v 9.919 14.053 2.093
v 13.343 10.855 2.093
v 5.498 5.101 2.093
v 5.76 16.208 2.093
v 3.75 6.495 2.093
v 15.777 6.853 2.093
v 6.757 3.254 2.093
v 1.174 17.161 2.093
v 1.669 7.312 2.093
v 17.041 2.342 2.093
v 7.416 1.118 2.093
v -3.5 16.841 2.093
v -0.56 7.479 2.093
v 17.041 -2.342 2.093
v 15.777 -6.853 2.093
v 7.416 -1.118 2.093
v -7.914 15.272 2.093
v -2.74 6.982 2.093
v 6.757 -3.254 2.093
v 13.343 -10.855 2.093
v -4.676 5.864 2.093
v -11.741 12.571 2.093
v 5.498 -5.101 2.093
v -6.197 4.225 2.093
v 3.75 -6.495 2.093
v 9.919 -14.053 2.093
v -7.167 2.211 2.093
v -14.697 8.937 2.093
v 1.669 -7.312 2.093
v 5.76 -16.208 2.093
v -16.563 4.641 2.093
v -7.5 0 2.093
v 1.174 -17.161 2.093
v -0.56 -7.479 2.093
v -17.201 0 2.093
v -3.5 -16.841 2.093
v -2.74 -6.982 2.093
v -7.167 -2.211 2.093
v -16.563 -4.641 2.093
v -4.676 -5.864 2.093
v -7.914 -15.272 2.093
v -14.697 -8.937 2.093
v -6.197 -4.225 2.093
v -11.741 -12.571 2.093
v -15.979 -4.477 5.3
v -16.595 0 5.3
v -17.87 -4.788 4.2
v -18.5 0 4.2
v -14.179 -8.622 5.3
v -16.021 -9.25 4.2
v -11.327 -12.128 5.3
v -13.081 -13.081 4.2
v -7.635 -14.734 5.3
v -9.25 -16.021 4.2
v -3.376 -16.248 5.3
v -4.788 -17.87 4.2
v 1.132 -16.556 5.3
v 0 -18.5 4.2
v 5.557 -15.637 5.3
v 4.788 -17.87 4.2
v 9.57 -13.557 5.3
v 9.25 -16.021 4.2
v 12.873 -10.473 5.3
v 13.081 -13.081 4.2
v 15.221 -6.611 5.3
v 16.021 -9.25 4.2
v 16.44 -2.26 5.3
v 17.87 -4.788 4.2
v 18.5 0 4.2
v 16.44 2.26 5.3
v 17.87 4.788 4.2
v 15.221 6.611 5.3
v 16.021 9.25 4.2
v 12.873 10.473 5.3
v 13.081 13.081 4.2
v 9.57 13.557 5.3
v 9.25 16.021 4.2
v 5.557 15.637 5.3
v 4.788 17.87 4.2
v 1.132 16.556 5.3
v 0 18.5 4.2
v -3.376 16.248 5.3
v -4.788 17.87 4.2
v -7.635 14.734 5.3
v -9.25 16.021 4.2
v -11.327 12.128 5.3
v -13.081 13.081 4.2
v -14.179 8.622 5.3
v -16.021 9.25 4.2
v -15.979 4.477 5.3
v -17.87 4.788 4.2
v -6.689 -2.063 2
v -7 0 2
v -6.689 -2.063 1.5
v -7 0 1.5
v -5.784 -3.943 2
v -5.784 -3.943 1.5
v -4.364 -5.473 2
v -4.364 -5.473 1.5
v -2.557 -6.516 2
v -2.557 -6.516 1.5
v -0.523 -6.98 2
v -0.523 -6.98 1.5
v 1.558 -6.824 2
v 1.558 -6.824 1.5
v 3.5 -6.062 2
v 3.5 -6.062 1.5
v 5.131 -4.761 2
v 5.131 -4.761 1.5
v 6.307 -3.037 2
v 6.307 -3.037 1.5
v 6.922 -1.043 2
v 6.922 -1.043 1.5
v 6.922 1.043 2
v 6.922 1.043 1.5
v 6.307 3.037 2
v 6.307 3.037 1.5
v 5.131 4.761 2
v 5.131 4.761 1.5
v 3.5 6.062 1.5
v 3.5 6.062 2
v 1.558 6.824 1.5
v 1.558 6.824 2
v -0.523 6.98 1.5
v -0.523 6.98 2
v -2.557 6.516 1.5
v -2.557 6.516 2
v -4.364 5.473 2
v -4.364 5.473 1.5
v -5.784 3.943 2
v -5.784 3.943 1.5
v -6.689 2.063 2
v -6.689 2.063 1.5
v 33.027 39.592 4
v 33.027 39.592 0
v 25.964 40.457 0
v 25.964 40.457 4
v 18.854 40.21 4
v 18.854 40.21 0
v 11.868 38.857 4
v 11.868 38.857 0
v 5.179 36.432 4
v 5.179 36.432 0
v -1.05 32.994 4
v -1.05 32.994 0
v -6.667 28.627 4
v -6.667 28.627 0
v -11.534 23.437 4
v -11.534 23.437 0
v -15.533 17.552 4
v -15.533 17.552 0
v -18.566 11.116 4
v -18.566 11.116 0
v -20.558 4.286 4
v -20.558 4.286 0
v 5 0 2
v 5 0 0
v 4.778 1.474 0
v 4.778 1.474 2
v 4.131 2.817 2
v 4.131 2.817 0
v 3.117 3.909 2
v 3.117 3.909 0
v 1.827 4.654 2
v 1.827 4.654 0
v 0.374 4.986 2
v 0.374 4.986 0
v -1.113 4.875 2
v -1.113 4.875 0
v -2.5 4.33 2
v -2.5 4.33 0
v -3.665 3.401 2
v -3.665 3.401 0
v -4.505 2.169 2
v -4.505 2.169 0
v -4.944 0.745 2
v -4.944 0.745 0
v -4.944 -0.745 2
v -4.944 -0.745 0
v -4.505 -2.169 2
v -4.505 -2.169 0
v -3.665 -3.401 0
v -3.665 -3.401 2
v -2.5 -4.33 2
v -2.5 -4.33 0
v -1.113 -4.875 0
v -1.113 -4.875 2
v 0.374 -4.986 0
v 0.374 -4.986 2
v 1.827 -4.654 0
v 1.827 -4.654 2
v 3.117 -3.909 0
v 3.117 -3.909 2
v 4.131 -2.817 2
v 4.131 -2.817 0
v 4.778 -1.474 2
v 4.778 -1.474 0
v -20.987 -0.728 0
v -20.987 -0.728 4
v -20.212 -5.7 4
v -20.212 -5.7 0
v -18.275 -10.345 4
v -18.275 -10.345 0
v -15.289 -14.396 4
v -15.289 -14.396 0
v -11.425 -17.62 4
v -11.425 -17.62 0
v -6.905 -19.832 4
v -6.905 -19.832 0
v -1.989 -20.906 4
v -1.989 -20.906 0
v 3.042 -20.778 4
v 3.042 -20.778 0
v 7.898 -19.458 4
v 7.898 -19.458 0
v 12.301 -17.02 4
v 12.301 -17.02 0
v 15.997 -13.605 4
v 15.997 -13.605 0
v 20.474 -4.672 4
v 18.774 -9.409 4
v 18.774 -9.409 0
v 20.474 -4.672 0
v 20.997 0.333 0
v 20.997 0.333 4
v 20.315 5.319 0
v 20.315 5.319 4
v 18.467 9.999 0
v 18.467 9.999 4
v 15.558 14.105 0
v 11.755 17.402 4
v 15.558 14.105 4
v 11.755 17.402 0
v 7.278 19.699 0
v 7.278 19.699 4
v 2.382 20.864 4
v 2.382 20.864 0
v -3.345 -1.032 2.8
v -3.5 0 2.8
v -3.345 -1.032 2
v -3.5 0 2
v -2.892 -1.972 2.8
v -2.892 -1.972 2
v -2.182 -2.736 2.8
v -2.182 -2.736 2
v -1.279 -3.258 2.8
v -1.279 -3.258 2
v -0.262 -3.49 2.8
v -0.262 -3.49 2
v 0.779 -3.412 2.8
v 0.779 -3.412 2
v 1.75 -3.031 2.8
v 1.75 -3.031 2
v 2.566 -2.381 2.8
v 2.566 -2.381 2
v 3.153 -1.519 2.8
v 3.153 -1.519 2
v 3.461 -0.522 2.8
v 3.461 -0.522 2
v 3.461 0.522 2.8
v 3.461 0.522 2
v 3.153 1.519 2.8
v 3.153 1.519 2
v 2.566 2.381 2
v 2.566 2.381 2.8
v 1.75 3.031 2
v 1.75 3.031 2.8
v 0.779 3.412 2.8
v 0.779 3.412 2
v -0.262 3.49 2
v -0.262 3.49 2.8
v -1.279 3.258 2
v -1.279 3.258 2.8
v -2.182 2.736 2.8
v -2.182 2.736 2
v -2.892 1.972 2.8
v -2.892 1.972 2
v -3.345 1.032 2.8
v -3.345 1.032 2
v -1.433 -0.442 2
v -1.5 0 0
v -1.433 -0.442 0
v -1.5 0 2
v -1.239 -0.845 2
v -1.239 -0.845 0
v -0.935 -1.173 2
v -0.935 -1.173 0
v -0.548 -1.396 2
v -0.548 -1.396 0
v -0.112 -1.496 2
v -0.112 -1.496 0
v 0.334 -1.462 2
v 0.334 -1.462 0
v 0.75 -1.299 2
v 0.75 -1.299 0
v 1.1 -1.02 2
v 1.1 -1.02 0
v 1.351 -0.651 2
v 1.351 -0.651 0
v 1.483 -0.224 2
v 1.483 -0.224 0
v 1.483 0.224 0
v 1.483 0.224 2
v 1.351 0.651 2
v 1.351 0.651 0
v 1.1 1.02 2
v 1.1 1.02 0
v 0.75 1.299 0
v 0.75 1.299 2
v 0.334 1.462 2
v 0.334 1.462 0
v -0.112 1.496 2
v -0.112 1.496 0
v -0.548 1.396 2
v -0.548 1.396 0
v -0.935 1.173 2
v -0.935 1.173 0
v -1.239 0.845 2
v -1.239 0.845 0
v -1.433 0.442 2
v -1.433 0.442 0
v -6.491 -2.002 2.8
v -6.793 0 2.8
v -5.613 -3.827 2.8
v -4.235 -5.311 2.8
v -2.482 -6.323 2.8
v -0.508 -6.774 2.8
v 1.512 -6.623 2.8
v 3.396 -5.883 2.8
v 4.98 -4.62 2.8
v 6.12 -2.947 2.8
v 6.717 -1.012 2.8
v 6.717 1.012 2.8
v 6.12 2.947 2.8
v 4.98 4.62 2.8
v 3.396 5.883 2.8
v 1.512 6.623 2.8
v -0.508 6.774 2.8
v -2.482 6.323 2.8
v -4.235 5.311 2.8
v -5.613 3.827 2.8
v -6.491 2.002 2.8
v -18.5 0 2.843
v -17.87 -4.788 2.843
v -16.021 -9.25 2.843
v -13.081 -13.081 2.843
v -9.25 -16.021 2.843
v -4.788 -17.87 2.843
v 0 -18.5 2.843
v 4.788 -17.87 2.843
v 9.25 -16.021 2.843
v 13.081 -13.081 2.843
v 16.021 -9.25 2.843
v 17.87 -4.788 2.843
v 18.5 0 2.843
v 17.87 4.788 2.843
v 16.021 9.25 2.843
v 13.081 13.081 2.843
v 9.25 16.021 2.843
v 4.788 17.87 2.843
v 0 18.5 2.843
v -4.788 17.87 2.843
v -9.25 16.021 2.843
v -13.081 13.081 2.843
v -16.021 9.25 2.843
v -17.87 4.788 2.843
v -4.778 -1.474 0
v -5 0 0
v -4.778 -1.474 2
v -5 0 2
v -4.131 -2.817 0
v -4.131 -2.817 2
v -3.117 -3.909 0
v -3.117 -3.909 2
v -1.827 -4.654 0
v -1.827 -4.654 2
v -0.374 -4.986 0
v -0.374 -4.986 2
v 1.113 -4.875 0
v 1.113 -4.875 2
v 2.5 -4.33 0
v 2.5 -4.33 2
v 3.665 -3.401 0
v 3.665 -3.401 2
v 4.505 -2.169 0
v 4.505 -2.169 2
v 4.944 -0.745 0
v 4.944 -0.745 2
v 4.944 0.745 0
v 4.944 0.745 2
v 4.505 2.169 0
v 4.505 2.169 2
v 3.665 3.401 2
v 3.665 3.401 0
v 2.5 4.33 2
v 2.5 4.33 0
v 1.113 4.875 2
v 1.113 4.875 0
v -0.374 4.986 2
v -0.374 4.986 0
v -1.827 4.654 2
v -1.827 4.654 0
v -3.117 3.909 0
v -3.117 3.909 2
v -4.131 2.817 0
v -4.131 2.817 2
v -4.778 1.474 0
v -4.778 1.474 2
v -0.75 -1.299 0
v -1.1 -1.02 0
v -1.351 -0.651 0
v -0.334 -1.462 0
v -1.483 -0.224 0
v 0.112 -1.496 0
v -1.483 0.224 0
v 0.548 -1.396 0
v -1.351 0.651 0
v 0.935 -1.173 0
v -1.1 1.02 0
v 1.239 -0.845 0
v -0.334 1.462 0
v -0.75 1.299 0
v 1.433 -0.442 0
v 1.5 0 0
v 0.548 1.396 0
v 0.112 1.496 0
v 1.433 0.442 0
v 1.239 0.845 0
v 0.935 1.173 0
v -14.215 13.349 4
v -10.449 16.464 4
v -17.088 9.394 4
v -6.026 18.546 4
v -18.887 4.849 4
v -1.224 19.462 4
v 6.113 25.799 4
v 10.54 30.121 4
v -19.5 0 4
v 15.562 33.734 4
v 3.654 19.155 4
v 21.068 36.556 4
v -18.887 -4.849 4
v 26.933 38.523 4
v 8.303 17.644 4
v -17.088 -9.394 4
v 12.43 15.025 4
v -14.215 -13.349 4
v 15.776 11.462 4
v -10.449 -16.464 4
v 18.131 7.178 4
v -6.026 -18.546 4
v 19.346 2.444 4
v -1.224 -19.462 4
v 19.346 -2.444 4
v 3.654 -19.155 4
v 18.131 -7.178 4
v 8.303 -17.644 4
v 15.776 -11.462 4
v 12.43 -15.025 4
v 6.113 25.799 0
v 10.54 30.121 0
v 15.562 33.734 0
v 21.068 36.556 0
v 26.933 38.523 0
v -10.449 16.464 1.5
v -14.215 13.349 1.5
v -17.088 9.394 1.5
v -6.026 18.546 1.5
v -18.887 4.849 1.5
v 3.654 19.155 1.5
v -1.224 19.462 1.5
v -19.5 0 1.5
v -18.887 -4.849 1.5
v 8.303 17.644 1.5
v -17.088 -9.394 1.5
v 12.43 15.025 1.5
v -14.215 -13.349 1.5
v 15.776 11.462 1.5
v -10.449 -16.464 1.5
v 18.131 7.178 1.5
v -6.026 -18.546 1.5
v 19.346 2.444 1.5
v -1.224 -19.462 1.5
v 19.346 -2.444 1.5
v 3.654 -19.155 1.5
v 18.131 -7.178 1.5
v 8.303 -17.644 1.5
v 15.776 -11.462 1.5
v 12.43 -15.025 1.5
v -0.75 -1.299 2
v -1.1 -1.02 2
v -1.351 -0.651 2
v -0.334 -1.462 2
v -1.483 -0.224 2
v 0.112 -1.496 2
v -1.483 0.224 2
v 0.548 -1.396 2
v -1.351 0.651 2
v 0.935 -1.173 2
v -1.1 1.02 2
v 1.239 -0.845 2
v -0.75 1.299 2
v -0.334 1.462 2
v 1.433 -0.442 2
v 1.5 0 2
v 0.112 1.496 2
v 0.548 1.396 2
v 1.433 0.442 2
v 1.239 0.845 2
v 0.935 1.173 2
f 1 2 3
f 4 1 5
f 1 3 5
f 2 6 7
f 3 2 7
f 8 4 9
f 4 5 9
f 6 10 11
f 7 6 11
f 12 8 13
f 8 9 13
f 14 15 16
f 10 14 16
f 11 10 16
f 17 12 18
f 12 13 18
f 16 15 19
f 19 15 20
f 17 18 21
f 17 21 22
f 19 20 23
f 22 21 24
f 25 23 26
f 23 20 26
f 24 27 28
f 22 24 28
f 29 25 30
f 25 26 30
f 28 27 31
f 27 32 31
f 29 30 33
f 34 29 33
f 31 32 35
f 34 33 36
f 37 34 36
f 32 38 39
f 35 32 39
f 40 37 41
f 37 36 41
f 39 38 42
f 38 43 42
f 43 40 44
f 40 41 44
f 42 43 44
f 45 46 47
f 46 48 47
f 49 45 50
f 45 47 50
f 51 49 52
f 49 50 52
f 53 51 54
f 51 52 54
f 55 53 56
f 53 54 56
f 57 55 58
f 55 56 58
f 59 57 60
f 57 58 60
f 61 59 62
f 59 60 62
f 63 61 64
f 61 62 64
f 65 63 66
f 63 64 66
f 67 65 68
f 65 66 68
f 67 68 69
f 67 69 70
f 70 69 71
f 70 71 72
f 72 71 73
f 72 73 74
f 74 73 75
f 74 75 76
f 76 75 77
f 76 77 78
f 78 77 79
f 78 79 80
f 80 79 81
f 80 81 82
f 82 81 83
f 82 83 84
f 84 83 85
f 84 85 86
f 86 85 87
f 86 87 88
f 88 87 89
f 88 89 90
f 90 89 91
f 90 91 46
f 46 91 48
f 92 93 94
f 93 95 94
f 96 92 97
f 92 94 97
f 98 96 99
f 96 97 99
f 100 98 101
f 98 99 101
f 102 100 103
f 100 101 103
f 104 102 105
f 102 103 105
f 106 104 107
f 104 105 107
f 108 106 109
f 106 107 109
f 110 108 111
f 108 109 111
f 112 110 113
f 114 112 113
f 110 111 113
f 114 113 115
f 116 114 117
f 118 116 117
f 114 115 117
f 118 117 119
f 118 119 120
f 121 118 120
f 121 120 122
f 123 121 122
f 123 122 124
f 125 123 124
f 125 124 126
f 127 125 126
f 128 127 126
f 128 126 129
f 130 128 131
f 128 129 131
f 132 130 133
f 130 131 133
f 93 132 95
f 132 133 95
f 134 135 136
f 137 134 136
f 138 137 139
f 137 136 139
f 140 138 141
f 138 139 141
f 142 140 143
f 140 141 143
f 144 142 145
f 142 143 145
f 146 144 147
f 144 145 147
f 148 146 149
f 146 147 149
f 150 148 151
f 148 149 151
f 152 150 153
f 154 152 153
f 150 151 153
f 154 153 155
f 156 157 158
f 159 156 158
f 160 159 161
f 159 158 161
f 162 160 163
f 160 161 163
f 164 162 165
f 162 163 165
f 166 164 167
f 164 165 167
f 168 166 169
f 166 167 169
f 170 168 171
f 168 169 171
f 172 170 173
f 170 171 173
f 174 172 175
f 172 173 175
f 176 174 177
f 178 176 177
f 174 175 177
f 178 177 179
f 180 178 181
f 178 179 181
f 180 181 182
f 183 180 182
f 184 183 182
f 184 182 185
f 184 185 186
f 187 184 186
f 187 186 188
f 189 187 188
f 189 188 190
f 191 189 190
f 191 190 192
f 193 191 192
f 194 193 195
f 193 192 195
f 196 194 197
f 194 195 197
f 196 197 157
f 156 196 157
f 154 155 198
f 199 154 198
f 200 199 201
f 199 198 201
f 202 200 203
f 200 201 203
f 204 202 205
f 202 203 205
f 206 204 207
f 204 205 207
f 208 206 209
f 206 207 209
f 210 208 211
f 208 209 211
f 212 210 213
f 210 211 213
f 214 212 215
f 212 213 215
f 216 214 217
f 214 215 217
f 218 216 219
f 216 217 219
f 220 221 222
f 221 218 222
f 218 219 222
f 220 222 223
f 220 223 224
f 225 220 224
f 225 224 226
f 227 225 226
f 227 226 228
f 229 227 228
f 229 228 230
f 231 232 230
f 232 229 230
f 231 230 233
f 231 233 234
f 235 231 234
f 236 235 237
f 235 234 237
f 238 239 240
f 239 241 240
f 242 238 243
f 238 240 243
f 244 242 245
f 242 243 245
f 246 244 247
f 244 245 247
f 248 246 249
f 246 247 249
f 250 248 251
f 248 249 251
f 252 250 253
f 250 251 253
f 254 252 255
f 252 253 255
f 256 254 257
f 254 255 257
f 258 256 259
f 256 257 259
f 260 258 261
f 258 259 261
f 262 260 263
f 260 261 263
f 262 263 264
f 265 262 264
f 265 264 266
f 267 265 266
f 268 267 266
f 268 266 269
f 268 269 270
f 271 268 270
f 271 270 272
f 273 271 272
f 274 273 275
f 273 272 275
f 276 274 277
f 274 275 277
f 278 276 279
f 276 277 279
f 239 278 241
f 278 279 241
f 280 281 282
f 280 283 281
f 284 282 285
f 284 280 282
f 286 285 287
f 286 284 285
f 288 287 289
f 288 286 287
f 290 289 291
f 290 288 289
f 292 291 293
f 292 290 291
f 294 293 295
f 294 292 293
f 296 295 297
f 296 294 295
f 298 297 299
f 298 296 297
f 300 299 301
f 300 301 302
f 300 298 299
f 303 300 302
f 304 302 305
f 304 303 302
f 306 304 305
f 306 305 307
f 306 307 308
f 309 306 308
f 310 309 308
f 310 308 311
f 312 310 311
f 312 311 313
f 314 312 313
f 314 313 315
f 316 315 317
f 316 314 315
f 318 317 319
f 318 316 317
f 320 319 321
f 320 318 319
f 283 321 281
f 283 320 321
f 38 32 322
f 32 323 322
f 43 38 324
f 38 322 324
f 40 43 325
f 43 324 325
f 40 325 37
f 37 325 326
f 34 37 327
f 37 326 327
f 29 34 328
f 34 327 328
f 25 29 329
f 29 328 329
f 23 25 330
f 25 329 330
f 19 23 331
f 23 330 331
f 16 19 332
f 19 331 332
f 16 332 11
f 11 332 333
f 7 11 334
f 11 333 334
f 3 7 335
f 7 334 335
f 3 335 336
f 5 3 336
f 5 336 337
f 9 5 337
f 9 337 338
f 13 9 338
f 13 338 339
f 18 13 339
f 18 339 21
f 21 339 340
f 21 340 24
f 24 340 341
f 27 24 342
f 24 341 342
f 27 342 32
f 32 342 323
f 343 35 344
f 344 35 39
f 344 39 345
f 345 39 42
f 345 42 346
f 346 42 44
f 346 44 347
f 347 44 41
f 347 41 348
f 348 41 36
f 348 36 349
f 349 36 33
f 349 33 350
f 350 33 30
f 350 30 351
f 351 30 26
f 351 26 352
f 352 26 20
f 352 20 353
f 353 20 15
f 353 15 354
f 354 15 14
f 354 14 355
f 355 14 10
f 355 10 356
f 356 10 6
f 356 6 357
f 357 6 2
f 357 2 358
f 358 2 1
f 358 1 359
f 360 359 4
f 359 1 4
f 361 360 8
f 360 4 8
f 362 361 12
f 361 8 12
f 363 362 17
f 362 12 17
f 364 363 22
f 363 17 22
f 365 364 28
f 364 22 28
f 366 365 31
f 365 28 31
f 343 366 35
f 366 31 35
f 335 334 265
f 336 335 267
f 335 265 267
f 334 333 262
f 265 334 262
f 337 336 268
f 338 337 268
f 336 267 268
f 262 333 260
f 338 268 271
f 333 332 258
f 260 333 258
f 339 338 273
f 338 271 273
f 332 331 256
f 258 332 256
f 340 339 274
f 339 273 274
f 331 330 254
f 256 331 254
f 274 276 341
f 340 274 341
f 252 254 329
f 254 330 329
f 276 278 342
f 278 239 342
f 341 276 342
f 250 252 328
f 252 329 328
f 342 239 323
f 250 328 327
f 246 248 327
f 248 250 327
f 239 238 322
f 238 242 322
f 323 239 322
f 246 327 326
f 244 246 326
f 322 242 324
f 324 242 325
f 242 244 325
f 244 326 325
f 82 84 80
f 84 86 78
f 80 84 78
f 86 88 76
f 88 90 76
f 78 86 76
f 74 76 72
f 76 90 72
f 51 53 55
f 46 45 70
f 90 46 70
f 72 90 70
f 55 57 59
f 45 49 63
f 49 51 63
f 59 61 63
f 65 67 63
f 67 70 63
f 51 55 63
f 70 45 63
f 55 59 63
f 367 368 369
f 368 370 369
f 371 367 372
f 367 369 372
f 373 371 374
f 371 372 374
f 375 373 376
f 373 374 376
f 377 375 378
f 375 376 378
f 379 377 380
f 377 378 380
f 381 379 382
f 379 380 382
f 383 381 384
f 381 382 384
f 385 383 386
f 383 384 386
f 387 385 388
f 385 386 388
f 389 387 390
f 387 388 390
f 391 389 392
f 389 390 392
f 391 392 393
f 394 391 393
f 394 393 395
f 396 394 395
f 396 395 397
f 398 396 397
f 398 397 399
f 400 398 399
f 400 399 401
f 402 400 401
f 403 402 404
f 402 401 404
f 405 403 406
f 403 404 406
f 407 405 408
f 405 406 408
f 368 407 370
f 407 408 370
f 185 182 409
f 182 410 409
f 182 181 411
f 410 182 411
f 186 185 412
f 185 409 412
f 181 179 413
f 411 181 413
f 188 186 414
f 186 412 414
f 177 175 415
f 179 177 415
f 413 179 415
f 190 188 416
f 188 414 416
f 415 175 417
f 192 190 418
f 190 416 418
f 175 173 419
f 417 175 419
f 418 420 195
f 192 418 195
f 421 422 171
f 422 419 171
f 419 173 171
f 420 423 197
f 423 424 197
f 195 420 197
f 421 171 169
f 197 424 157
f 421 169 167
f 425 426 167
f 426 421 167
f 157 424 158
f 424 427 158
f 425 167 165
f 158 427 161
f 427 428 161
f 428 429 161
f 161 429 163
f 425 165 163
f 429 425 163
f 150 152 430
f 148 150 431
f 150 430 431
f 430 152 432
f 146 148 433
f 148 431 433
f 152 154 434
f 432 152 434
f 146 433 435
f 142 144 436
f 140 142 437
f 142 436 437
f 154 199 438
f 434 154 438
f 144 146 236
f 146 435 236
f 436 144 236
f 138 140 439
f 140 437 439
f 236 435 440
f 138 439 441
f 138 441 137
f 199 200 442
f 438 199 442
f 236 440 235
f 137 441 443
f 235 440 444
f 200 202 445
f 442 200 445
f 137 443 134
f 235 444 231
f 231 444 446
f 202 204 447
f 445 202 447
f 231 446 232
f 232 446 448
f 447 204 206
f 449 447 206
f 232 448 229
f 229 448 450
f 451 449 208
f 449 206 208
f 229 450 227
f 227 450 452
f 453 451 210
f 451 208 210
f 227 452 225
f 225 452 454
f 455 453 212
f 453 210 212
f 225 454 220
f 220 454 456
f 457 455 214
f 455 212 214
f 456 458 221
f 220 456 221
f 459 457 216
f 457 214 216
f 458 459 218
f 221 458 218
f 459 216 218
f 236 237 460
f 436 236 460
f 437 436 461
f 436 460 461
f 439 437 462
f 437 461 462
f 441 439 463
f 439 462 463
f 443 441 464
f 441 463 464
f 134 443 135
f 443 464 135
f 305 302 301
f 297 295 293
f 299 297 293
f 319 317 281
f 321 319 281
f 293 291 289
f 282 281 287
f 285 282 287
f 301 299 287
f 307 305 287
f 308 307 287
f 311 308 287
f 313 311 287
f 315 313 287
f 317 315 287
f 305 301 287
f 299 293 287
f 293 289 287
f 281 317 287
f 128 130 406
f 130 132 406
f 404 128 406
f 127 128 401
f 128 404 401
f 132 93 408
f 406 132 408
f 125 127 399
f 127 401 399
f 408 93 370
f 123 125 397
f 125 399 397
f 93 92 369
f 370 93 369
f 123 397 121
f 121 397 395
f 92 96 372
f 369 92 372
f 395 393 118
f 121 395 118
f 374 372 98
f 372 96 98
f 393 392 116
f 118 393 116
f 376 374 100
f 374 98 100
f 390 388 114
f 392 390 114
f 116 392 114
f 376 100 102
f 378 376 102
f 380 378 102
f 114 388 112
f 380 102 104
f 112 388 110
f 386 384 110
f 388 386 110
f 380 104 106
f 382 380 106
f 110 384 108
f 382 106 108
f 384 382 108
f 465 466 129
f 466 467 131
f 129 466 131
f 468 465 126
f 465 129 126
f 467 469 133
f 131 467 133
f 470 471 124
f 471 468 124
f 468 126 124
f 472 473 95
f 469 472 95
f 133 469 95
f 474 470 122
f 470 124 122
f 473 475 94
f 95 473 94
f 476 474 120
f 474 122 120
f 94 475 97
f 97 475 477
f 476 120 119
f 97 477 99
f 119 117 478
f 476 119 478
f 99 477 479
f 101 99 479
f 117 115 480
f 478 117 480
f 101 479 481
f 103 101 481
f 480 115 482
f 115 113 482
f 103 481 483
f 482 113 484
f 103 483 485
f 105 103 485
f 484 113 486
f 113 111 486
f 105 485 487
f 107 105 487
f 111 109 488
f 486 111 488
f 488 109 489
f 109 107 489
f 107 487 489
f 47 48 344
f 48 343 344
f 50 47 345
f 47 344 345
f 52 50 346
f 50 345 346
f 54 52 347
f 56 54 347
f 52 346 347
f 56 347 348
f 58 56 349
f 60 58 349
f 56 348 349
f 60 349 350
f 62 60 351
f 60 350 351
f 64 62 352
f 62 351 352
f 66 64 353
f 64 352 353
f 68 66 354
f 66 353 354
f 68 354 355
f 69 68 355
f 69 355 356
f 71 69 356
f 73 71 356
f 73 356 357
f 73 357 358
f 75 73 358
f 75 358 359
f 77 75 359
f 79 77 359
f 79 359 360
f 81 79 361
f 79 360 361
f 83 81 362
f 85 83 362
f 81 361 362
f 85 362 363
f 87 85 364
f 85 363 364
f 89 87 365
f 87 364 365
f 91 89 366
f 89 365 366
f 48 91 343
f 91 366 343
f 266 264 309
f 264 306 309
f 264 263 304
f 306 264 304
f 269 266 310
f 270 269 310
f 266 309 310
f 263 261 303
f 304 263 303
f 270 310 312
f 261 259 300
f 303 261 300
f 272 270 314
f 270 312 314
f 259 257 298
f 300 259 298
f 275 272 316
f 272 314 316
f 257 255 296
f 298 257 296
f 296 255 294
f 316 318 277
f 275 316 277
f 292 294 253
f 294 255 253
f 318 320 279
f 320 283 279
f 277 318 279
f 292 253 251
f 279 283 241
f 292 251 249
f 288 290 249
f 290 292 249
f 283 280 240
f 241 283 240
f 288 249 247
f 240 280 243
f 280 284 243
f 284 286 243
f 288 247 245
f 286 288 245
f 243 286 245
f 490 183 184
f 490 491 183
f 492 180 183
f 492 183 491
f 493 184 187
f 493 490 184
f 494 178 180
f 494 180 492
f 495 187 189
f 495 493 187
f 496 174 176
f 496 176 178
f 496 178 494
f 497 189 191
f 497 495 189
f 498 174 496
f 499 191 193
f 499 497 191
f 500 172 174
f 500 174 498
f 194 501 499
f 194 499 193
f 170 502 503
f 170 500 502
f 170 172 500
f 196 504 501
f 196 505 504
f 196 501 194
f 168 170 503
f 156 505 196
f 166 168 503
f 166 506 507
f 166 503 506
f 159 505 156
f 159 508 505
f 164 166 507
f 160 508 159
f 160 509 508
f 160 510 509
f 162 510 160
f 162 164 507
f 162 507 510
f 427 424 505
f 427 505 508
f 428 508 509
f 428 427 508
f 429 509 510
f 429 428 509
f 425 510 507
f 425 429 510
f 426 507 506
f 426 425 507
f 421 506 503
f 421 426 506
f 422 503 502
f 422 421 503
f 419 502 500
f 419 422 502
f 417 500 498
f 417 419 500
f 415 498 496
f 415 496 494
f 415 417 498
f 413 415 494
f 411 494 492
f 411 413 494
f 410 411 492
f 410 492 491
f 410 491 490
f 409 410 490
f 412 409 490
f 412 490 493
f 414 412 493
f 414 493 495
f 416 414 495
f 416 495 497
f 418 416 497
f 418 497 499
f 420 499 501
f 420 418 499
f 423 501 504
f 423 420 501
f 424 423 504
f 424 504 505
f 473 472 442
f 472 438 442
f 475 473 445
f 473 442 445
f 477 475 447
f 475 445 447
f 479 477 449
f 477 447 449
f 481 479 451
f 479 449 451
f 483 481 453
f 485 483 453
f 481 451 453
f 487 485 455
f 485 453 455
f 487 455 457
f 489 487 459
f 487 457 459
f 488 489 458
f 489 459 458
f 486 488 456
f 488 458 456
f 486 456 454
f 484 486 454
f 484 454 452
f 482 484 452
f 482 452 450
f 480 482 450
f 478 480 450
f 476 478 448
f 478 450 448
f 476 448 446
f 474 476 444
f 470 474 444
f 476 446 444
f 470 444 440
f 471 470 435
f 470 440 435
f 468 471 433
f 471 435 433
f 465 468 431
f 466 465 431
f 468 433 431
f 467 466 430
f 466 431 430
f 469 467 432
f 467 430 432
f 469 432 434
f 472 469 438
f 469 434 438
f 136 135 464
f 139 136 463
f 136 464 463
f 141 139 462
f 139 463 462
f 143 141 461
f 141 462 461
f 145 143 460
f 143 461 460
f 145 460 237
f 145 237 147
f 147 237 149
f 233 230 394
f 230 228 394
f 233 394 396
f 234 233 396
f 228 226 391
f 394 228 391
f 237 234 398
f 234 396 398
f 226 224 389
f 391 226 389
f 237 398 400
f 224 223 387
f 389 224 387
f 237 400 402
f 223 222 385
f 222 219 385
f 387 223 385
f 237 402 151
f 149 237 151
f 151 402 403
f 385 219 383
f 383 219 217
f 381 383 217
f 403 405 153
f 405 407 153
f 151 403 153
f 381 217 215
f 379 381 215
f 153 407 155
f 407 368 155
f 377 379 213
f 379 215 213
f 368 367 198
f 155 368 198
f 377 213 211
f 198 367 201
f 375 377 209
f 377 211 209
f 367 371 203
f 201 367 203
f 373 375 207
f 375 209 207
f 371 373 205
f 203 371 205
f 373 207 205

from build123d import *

# Parameters (mm, degrees)
F0_R     = 5
F0_R_2   = 1.5
F1_DEPTH = 2
F4_W     = 1.5
F4_H     = 2
F7_DEPTH = 4


# Not quite as in the source:
# - a feature of the source that left no trace in its solid (it failed there, or was rolled back) is left out


with BuildPart() as f1:
    # F0 (on Top) → F1 (new body)
    with BuildSketch(Plane.XY):
        Circle(F0_R)
        Circle(F0_R_2, mode=Mode.SUBTRACT)
    extrude(amount=F1_DEPTH)


with BuildPart() as f3:
    # F2 (on Front) → F3 (revolve)
    with BuildSketch(Plane.XZ):
        Polygon((-21, 0), (-5, 0), (-5, 2), (-7, 2), (-7, 1.5), (-19.5, 1.5), (-19.5, 4), (-21, 4), align=None)
    revolve(axis=Axis((0, 0, 2.9167793691), (0, 0, 1)))

    # F6 (on Top) → F7 (join, through all)
    with BuildSketch(Plane.XY):
        with BuildLine():
            ThreePointArc((2.3821237217, 20.8644550989), (15.5620656061, 33.7338722927), (33.0265901225, 39.5924685753))
            ThreePointArc((33.0265901225, 39.5924685753), (-1.0497554808, 32.9939806535), (-20.5580313112, 4.2857144807))
            ThreePointArc((-20.5580313112, 4.2857144807), (-12.3005920304, 17.0204417012), (2.3821237217, 20.8644550989))
        make_face()
    extrude(amount=F7_DEPTH)


with BuildPart() as f5:
    # F4 (on Front) → F5 (revolve)
    with BuildSketch(Plane.XZ):
        Polygon((0, 2), (0, 5.3), (-16.5947441117, 5.3), (-18.5, 4.2), (-18.5, 2.8428932188), (-17.2009618943, 2.0928932188), (-7.5, 2.0928932188), (-6.7928932188, 2.8), (-3.5, 2.8), (-3.5, 2), (-1.5, 2), align=None)
        with Locations((-0.75, 1)):
            Rectangle(F4_W, F4_H)
    revolve(axis=Axis((0, 0, 2.65), (0, 0, 1)))


solid = Compound([f1.part, f3.part, f5.part])
